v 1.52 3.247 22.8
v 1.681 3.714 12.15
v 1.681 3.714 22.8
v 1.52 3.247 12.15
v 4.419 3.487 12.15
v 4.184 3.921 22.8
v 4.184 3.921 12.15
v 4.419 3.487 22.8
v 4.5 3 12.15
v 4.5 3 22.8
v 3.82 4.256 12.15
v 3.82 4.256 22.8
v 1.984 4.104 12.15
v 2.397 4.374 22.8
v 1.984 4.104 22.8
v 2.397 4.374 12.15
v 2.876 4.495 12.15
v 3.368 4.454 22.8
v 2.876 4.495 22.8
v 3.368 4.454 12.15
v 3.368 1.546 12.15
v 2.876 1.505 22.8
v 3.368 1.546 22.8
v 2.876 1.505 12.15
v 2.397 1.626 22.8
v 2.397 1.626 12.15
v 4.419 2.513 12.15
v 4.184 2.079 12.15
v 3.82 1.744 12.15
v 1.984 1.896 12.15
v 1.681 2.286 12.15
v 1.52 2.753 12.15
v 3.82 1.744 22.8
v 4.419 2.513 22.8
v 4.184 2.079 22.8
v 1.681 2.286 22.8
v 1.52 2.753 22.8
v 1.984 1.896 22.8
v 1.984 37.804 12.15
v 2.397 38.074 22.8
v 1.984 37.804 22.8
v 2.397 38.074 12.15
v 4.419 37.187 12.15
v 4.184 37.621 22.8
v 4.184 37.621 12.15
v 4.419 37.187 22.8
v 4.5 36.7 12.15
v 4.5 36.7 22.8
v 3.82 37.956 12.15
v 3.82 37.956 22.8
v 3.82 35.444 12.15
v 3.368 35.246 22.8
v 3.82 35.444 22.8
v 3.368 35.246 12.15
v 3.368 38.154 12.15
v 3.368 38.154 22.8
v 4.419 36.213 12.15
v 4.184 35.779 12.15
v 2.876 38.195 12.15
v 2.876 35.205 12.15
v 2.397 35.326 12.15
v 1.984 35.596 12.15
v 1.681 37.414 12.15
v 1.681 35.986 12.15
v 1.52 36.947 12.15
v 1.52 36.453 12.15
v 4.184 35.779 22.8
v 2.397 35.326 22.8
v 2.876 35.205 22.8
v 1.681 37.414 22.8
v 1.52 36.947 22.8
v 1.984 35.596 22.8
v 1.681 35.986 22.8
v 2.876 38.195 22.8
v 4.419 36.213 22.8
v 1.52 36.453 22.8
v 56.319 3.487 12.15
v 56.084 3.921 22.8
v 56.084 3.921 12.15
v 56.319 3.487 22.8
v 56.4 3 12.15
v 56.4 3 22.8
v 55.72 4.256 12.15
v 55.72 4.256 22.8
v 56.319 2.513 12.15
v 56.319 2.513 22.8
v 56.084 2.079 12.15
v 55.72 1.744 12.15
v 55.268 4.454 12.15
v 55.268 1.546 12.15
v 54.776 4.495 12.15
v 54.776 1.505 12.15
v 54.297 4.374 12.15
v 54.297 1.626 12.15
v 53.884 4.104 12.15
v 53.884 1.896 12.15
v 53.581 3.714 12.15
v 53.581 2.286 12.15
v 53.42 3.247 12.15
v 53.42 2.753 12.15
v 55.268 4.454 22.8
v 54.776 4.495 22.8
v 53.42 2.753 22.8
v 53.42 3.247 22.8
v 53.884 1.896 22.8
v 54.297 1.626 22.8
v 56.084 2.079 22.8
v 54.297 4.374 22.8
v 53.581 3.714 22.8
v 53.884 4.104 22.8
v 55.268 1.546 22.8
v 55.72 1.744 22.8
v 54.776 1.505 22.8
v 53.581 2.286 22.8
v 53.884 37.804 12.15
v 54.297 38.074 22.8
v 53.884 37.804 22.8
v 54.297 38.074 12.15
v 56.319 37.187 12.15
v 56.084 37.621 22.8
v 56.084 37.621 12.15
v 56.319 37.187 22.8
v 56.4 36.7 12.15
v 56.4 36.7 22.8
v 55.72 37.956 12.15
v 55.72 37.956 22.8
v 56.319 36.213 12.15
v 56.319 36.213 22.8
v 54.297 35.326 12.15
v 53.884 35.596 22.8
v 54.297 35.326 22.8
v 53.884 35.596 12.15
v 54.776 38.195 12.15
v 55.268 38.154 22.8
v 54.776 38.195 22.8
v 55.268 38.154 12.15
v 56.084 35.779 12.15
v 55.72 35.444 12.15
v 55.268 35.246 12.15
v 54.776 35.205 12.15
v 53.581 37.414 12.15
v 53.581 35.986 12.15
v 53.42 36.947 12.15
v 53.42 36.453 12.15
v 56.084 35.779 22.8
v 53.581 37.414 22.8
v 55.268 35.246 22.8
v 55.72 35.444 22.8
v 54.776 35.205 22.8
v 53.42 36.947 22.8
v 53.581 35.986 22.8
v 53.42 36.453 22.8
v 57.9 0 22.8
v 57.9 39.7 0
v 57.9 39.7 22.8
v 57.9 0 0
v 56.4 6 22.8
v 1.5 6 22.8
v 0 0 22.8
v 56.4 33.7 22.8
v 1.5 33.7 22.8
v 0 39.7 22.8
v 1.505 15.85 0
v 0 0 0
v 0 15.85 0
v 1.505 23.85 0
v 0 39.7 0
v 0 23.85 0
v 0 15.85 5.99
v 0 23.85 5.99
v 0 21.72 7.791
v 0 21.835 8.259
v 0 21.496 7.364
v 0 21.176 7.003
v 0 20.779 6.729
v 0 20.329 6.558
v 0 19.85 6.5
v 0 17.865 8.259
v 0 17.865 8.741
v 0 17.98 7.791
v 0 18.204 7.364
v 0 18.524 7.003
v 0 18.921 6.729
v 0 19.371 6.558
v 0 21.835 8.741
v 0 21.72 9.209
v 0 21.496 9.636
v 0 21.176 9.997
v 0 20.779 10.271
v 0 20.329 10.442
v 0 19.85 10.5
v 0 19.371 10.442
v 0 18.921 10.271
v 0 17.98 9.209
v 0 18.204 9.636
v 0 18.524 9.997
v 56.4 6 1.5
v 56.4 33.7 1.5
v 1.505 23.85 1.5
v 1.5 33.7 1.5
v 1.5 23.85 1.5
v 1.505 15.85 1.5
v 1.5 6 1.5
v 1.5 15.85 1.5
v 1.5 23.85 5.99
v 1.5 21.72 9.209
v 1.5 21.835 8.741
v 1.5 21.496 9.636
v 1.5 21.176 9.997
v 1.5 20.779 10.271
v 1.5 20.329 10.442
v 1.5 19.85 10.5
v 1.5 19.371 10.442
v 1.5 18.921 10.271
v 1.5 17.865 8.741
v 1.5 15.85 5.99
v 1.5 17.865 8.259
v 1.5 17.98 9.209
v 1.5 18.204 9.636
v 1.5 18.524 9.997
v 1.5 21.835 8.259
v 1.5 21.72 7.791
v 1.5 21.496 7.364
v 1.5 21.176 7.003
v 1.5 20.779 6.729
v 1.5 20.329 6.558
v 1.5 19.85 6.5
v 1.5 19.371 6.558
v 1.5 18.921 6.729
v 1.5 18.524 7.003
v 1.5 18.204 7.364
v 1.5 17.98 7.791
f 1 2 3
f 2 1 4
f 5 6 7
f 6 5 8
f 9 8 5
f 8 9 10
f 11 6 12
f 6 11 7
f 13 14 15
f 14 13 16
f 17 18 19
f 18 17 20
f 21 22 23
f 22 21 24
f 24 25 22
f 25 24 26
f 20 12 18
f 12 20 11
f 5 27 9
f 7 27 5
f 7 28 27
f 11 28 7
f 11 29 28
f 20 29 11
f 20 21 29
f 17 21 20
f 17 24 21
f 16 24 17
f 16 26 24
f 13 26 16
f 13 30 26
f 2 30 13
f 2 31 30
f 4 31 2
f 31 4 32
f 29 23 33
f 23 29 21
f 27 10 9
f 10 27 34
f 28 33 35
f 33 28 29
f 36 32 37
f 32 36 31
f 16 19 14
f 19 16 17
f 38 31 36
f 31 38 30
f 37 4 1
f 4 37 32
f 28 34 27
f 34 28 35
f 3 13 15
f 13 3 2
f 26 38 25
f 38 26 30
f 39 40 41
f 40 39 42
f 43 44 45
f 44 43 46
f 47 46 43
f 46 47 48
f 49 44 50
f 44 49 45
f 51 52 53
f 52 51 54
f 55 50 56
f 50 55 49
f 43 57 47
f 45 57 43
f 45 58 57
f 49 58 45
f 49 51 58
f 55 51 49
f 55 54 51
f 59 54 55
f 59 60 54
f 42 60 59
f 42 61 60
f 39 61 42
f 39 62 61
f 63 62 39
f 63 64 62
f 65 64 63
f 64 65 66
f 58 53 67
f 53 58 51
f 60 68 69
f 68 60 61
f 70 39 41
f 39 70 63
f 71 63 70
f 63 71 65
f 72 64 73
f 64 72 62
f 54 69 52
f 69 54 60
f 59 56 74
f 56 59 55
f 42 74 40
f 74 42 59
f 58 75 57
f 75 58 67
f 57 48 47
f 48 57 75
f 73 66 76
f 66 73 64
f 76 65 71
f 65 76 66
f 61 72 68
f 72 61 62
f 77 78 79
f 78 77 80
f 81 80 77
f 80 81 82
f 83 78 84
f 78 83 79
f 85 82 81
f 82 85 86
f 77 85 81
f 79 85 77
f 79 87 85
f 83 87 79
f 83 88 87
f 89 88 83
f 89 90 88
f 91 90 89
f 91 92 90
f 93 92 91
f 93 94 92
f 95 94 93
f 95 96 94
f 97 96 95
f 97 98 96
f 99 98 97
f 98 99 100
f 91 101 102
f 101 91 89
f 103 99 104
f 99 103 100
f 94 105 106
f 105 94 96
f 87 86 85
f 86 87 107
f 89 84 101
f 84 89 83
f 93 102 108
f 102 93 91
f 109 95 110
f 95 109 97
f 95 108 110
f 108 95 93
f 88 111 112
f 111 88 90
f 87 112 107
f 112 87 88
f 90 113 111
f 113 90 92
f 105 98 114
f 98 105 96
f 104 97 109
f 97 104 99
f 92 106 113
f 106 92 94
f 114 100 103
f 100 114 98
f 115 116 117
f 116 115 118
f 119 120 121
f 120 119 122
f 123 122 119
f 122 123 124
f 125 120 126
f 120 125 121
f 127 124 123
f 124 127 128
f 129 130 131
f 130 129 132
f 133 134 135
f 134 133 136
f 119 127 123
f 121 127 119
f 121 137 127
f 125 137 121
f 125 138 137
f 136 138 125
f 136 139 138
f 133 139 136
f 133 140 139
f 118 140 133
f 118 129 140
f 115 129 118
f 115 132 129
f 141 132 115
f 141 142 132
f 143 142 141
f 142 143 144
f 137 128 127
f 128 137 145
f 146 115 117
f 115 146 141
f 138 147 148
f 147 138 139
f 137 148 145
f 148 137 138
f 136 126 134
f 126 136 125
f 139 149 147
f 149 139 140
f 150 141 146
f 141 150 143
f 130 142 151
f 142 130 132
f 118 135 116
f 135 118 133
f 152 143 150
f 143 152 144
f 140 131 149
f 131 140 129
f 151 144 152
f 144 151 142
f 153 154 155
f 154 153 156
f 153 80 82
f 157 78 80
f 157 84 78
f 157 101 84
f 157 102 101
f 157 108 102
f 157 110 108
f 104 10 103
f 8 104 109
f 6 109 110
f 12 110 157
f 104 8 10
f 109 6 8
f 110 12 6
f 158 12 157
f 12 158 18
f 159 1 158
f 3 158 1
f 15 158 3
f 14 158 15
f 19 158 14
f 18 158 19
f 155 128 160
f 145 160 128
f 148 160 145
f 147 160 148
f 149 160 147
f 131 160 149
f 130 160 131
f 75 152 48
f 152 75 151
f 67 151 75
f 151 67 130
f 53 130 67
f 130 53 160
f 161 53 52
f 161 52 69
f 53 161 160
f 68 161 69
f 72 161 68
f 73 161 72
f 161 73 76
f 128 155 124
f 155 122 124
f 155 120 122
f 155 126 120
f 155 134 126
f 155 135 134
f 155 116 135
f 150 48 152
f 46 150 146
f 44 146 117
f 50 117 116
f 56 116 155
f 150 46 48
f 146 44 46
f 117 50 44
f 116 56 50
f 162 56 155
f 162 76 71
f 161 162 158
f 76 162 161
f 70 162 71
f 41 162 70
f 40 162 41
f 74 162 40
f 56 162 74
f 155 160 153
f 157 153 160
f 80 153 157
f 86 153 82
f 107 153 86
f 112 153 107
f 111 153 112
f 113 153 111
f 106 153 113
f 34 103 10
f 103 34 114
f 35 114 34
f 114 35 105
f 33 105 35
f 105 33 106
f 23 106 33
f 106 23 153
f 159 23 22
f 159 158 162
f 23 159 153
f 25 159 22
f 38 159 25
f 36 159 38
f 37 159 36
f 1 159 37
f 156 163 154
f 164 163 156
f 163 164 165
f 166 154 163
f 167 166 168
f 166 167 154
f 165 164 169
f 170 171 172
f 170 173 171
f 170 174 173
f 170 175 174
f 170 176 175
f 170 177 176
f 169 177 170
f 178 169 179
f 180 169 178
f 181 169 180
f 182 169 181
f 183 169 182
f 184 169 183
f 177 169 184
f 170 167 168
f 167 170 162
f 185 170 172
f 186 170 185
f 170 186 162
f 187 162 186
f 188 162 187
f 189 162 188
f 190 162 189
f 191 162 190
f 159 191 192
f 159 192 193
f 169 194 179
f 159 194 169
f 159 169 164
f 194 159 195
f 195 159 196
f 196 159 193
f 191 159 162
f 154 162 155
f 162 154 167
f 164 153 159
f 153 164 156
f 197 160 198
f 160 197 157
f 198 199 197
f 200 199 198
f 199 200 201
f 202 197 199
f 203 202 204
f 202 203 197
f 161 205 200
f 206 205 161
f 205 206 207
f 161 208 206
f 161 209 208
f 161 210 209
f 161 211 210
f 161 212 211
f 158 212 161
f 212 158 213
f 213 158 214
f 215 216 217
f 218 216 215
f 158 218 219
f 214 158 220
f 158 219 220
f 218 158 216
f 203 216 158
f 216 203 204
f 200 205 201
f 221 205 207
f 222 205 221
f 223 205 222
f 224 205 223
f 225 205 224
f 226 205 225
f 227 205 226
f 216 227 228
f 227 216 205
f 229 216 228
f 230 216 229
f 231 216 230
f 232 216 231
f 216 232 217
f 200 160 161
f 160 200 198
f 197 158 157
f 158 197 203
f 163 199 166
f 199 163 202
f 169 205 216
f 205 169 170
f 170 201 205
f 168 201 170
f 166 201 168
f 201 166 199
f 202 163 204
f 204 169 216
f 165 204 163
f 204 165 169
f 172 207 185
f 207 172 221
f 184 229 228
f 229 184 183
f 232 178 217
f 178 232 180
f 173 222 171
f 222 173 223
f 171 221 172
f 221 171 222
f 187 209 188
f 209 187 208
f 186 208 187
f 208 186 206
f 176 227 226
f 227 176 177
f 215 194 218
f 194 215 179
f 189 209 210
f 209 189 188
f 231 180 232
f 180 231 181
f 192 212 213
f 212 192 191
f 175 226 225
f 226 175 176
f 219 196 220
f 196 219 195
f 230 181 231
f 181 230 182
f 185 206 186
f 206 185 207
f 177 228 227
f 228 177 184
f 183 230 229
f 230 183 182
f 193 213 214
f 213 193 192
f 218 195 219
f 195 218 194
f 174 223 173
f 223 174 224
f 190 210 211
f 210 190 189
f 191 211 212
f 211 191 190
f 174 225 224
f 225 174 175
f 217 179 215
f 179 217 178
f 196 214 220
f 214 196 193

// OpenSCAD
part="bottom"; //[bottom,top,button]
wall=1.5;
extra=4; //lip on the lid that presses top pcb down
thread=3;
air=0.5;
bissl=1/100;
button=4;
joystick=6;
height=16.8+air+extra;
width=52.4+1.5+2*air;
length=26.7+2*air;
$fa=1/1;
$fs=1/2;
module bottom() {
  difference() {
    cube([width+2*wall,length+4*wall+2*thread,height+wall]);
    translate([wall,2*wall+thread,wall])cube([width,length,height+bissl]);
    for (tr=[[wall+thread/2,wall+thread/2,height/2+wall],
             [wall+thread/2,length+3*wall+1.5*thread,height/2+wall],
             [width+wall-thread/2,wall+thread/2,height/2+wall],
             [width+wall-thread/2,length+3*wall+1.5*thread,height/2+wall]])
      translate(tr) cylinder(h=height/2+bissl,d=thread);
    translate([wall/2,2*wall+thread+length/2,3-bissl])cube([wall+bissl,8,6],center=true);
    translate([0,2*wall+thread+length/2,wall+7])rotate([0,90,0])cylinder(d=button,h=2*wall+bissl,center=true);
  }
}
module top() {
  difference() {
    cube([width+2*wall,length+4*wall+2*thread,wall]); 
    for (tr=[[wall+thread/2,wall+thread/2,-bissl],
             [wall+thread/2,length+3*wall+1.5*thread,-bissl],
             [width+wall-thread/2,wall+thread/2,-bissl],
             [width+wall-thread/2,length+3*wall+1.5*thread,-bissl]]) 
      translate(tr) cylinder(h=wall+2*bissl,d=thread);
    translate([wall+1.5,2*wall+thread,-bissl]) 
      for (tr=[[47.7+air,5.5+0],
               [47.7+air,5.5+5.7],
               [47.7+air,5.5+2*5.7],
               [47.7+air,5.5+3*5.7],
               [6.7+0.5,13.8+air]]) 
        translate(tr) cylinder(h=wall+2*bissl,d=button);
    translate([wall+1.5+6.7+air,2*wall+thread+13.8+air,-bissl]) cylinder(h=wall+2*bissl,d=joystick);
    translate([wall+13.5+1.5,2*wall+thread,-bissl])cube([31,27,wall+2*bissl]);
  }
  translate([wall+13.5+1.5-2,2*wall+thread,-extra])cube([2,27,extra]);
  translate([wall+13.5+1.5+31,2*wall+thread,-extra])cube([2,27,extra]);
}
module button() {
  cylinder(h=1,d=5);
  cylinder(h=5,d=3);
}
if (part=="bottom")bottom();
if (part=="top")rotate([180,0,0])top();
if (part=="button")button();
